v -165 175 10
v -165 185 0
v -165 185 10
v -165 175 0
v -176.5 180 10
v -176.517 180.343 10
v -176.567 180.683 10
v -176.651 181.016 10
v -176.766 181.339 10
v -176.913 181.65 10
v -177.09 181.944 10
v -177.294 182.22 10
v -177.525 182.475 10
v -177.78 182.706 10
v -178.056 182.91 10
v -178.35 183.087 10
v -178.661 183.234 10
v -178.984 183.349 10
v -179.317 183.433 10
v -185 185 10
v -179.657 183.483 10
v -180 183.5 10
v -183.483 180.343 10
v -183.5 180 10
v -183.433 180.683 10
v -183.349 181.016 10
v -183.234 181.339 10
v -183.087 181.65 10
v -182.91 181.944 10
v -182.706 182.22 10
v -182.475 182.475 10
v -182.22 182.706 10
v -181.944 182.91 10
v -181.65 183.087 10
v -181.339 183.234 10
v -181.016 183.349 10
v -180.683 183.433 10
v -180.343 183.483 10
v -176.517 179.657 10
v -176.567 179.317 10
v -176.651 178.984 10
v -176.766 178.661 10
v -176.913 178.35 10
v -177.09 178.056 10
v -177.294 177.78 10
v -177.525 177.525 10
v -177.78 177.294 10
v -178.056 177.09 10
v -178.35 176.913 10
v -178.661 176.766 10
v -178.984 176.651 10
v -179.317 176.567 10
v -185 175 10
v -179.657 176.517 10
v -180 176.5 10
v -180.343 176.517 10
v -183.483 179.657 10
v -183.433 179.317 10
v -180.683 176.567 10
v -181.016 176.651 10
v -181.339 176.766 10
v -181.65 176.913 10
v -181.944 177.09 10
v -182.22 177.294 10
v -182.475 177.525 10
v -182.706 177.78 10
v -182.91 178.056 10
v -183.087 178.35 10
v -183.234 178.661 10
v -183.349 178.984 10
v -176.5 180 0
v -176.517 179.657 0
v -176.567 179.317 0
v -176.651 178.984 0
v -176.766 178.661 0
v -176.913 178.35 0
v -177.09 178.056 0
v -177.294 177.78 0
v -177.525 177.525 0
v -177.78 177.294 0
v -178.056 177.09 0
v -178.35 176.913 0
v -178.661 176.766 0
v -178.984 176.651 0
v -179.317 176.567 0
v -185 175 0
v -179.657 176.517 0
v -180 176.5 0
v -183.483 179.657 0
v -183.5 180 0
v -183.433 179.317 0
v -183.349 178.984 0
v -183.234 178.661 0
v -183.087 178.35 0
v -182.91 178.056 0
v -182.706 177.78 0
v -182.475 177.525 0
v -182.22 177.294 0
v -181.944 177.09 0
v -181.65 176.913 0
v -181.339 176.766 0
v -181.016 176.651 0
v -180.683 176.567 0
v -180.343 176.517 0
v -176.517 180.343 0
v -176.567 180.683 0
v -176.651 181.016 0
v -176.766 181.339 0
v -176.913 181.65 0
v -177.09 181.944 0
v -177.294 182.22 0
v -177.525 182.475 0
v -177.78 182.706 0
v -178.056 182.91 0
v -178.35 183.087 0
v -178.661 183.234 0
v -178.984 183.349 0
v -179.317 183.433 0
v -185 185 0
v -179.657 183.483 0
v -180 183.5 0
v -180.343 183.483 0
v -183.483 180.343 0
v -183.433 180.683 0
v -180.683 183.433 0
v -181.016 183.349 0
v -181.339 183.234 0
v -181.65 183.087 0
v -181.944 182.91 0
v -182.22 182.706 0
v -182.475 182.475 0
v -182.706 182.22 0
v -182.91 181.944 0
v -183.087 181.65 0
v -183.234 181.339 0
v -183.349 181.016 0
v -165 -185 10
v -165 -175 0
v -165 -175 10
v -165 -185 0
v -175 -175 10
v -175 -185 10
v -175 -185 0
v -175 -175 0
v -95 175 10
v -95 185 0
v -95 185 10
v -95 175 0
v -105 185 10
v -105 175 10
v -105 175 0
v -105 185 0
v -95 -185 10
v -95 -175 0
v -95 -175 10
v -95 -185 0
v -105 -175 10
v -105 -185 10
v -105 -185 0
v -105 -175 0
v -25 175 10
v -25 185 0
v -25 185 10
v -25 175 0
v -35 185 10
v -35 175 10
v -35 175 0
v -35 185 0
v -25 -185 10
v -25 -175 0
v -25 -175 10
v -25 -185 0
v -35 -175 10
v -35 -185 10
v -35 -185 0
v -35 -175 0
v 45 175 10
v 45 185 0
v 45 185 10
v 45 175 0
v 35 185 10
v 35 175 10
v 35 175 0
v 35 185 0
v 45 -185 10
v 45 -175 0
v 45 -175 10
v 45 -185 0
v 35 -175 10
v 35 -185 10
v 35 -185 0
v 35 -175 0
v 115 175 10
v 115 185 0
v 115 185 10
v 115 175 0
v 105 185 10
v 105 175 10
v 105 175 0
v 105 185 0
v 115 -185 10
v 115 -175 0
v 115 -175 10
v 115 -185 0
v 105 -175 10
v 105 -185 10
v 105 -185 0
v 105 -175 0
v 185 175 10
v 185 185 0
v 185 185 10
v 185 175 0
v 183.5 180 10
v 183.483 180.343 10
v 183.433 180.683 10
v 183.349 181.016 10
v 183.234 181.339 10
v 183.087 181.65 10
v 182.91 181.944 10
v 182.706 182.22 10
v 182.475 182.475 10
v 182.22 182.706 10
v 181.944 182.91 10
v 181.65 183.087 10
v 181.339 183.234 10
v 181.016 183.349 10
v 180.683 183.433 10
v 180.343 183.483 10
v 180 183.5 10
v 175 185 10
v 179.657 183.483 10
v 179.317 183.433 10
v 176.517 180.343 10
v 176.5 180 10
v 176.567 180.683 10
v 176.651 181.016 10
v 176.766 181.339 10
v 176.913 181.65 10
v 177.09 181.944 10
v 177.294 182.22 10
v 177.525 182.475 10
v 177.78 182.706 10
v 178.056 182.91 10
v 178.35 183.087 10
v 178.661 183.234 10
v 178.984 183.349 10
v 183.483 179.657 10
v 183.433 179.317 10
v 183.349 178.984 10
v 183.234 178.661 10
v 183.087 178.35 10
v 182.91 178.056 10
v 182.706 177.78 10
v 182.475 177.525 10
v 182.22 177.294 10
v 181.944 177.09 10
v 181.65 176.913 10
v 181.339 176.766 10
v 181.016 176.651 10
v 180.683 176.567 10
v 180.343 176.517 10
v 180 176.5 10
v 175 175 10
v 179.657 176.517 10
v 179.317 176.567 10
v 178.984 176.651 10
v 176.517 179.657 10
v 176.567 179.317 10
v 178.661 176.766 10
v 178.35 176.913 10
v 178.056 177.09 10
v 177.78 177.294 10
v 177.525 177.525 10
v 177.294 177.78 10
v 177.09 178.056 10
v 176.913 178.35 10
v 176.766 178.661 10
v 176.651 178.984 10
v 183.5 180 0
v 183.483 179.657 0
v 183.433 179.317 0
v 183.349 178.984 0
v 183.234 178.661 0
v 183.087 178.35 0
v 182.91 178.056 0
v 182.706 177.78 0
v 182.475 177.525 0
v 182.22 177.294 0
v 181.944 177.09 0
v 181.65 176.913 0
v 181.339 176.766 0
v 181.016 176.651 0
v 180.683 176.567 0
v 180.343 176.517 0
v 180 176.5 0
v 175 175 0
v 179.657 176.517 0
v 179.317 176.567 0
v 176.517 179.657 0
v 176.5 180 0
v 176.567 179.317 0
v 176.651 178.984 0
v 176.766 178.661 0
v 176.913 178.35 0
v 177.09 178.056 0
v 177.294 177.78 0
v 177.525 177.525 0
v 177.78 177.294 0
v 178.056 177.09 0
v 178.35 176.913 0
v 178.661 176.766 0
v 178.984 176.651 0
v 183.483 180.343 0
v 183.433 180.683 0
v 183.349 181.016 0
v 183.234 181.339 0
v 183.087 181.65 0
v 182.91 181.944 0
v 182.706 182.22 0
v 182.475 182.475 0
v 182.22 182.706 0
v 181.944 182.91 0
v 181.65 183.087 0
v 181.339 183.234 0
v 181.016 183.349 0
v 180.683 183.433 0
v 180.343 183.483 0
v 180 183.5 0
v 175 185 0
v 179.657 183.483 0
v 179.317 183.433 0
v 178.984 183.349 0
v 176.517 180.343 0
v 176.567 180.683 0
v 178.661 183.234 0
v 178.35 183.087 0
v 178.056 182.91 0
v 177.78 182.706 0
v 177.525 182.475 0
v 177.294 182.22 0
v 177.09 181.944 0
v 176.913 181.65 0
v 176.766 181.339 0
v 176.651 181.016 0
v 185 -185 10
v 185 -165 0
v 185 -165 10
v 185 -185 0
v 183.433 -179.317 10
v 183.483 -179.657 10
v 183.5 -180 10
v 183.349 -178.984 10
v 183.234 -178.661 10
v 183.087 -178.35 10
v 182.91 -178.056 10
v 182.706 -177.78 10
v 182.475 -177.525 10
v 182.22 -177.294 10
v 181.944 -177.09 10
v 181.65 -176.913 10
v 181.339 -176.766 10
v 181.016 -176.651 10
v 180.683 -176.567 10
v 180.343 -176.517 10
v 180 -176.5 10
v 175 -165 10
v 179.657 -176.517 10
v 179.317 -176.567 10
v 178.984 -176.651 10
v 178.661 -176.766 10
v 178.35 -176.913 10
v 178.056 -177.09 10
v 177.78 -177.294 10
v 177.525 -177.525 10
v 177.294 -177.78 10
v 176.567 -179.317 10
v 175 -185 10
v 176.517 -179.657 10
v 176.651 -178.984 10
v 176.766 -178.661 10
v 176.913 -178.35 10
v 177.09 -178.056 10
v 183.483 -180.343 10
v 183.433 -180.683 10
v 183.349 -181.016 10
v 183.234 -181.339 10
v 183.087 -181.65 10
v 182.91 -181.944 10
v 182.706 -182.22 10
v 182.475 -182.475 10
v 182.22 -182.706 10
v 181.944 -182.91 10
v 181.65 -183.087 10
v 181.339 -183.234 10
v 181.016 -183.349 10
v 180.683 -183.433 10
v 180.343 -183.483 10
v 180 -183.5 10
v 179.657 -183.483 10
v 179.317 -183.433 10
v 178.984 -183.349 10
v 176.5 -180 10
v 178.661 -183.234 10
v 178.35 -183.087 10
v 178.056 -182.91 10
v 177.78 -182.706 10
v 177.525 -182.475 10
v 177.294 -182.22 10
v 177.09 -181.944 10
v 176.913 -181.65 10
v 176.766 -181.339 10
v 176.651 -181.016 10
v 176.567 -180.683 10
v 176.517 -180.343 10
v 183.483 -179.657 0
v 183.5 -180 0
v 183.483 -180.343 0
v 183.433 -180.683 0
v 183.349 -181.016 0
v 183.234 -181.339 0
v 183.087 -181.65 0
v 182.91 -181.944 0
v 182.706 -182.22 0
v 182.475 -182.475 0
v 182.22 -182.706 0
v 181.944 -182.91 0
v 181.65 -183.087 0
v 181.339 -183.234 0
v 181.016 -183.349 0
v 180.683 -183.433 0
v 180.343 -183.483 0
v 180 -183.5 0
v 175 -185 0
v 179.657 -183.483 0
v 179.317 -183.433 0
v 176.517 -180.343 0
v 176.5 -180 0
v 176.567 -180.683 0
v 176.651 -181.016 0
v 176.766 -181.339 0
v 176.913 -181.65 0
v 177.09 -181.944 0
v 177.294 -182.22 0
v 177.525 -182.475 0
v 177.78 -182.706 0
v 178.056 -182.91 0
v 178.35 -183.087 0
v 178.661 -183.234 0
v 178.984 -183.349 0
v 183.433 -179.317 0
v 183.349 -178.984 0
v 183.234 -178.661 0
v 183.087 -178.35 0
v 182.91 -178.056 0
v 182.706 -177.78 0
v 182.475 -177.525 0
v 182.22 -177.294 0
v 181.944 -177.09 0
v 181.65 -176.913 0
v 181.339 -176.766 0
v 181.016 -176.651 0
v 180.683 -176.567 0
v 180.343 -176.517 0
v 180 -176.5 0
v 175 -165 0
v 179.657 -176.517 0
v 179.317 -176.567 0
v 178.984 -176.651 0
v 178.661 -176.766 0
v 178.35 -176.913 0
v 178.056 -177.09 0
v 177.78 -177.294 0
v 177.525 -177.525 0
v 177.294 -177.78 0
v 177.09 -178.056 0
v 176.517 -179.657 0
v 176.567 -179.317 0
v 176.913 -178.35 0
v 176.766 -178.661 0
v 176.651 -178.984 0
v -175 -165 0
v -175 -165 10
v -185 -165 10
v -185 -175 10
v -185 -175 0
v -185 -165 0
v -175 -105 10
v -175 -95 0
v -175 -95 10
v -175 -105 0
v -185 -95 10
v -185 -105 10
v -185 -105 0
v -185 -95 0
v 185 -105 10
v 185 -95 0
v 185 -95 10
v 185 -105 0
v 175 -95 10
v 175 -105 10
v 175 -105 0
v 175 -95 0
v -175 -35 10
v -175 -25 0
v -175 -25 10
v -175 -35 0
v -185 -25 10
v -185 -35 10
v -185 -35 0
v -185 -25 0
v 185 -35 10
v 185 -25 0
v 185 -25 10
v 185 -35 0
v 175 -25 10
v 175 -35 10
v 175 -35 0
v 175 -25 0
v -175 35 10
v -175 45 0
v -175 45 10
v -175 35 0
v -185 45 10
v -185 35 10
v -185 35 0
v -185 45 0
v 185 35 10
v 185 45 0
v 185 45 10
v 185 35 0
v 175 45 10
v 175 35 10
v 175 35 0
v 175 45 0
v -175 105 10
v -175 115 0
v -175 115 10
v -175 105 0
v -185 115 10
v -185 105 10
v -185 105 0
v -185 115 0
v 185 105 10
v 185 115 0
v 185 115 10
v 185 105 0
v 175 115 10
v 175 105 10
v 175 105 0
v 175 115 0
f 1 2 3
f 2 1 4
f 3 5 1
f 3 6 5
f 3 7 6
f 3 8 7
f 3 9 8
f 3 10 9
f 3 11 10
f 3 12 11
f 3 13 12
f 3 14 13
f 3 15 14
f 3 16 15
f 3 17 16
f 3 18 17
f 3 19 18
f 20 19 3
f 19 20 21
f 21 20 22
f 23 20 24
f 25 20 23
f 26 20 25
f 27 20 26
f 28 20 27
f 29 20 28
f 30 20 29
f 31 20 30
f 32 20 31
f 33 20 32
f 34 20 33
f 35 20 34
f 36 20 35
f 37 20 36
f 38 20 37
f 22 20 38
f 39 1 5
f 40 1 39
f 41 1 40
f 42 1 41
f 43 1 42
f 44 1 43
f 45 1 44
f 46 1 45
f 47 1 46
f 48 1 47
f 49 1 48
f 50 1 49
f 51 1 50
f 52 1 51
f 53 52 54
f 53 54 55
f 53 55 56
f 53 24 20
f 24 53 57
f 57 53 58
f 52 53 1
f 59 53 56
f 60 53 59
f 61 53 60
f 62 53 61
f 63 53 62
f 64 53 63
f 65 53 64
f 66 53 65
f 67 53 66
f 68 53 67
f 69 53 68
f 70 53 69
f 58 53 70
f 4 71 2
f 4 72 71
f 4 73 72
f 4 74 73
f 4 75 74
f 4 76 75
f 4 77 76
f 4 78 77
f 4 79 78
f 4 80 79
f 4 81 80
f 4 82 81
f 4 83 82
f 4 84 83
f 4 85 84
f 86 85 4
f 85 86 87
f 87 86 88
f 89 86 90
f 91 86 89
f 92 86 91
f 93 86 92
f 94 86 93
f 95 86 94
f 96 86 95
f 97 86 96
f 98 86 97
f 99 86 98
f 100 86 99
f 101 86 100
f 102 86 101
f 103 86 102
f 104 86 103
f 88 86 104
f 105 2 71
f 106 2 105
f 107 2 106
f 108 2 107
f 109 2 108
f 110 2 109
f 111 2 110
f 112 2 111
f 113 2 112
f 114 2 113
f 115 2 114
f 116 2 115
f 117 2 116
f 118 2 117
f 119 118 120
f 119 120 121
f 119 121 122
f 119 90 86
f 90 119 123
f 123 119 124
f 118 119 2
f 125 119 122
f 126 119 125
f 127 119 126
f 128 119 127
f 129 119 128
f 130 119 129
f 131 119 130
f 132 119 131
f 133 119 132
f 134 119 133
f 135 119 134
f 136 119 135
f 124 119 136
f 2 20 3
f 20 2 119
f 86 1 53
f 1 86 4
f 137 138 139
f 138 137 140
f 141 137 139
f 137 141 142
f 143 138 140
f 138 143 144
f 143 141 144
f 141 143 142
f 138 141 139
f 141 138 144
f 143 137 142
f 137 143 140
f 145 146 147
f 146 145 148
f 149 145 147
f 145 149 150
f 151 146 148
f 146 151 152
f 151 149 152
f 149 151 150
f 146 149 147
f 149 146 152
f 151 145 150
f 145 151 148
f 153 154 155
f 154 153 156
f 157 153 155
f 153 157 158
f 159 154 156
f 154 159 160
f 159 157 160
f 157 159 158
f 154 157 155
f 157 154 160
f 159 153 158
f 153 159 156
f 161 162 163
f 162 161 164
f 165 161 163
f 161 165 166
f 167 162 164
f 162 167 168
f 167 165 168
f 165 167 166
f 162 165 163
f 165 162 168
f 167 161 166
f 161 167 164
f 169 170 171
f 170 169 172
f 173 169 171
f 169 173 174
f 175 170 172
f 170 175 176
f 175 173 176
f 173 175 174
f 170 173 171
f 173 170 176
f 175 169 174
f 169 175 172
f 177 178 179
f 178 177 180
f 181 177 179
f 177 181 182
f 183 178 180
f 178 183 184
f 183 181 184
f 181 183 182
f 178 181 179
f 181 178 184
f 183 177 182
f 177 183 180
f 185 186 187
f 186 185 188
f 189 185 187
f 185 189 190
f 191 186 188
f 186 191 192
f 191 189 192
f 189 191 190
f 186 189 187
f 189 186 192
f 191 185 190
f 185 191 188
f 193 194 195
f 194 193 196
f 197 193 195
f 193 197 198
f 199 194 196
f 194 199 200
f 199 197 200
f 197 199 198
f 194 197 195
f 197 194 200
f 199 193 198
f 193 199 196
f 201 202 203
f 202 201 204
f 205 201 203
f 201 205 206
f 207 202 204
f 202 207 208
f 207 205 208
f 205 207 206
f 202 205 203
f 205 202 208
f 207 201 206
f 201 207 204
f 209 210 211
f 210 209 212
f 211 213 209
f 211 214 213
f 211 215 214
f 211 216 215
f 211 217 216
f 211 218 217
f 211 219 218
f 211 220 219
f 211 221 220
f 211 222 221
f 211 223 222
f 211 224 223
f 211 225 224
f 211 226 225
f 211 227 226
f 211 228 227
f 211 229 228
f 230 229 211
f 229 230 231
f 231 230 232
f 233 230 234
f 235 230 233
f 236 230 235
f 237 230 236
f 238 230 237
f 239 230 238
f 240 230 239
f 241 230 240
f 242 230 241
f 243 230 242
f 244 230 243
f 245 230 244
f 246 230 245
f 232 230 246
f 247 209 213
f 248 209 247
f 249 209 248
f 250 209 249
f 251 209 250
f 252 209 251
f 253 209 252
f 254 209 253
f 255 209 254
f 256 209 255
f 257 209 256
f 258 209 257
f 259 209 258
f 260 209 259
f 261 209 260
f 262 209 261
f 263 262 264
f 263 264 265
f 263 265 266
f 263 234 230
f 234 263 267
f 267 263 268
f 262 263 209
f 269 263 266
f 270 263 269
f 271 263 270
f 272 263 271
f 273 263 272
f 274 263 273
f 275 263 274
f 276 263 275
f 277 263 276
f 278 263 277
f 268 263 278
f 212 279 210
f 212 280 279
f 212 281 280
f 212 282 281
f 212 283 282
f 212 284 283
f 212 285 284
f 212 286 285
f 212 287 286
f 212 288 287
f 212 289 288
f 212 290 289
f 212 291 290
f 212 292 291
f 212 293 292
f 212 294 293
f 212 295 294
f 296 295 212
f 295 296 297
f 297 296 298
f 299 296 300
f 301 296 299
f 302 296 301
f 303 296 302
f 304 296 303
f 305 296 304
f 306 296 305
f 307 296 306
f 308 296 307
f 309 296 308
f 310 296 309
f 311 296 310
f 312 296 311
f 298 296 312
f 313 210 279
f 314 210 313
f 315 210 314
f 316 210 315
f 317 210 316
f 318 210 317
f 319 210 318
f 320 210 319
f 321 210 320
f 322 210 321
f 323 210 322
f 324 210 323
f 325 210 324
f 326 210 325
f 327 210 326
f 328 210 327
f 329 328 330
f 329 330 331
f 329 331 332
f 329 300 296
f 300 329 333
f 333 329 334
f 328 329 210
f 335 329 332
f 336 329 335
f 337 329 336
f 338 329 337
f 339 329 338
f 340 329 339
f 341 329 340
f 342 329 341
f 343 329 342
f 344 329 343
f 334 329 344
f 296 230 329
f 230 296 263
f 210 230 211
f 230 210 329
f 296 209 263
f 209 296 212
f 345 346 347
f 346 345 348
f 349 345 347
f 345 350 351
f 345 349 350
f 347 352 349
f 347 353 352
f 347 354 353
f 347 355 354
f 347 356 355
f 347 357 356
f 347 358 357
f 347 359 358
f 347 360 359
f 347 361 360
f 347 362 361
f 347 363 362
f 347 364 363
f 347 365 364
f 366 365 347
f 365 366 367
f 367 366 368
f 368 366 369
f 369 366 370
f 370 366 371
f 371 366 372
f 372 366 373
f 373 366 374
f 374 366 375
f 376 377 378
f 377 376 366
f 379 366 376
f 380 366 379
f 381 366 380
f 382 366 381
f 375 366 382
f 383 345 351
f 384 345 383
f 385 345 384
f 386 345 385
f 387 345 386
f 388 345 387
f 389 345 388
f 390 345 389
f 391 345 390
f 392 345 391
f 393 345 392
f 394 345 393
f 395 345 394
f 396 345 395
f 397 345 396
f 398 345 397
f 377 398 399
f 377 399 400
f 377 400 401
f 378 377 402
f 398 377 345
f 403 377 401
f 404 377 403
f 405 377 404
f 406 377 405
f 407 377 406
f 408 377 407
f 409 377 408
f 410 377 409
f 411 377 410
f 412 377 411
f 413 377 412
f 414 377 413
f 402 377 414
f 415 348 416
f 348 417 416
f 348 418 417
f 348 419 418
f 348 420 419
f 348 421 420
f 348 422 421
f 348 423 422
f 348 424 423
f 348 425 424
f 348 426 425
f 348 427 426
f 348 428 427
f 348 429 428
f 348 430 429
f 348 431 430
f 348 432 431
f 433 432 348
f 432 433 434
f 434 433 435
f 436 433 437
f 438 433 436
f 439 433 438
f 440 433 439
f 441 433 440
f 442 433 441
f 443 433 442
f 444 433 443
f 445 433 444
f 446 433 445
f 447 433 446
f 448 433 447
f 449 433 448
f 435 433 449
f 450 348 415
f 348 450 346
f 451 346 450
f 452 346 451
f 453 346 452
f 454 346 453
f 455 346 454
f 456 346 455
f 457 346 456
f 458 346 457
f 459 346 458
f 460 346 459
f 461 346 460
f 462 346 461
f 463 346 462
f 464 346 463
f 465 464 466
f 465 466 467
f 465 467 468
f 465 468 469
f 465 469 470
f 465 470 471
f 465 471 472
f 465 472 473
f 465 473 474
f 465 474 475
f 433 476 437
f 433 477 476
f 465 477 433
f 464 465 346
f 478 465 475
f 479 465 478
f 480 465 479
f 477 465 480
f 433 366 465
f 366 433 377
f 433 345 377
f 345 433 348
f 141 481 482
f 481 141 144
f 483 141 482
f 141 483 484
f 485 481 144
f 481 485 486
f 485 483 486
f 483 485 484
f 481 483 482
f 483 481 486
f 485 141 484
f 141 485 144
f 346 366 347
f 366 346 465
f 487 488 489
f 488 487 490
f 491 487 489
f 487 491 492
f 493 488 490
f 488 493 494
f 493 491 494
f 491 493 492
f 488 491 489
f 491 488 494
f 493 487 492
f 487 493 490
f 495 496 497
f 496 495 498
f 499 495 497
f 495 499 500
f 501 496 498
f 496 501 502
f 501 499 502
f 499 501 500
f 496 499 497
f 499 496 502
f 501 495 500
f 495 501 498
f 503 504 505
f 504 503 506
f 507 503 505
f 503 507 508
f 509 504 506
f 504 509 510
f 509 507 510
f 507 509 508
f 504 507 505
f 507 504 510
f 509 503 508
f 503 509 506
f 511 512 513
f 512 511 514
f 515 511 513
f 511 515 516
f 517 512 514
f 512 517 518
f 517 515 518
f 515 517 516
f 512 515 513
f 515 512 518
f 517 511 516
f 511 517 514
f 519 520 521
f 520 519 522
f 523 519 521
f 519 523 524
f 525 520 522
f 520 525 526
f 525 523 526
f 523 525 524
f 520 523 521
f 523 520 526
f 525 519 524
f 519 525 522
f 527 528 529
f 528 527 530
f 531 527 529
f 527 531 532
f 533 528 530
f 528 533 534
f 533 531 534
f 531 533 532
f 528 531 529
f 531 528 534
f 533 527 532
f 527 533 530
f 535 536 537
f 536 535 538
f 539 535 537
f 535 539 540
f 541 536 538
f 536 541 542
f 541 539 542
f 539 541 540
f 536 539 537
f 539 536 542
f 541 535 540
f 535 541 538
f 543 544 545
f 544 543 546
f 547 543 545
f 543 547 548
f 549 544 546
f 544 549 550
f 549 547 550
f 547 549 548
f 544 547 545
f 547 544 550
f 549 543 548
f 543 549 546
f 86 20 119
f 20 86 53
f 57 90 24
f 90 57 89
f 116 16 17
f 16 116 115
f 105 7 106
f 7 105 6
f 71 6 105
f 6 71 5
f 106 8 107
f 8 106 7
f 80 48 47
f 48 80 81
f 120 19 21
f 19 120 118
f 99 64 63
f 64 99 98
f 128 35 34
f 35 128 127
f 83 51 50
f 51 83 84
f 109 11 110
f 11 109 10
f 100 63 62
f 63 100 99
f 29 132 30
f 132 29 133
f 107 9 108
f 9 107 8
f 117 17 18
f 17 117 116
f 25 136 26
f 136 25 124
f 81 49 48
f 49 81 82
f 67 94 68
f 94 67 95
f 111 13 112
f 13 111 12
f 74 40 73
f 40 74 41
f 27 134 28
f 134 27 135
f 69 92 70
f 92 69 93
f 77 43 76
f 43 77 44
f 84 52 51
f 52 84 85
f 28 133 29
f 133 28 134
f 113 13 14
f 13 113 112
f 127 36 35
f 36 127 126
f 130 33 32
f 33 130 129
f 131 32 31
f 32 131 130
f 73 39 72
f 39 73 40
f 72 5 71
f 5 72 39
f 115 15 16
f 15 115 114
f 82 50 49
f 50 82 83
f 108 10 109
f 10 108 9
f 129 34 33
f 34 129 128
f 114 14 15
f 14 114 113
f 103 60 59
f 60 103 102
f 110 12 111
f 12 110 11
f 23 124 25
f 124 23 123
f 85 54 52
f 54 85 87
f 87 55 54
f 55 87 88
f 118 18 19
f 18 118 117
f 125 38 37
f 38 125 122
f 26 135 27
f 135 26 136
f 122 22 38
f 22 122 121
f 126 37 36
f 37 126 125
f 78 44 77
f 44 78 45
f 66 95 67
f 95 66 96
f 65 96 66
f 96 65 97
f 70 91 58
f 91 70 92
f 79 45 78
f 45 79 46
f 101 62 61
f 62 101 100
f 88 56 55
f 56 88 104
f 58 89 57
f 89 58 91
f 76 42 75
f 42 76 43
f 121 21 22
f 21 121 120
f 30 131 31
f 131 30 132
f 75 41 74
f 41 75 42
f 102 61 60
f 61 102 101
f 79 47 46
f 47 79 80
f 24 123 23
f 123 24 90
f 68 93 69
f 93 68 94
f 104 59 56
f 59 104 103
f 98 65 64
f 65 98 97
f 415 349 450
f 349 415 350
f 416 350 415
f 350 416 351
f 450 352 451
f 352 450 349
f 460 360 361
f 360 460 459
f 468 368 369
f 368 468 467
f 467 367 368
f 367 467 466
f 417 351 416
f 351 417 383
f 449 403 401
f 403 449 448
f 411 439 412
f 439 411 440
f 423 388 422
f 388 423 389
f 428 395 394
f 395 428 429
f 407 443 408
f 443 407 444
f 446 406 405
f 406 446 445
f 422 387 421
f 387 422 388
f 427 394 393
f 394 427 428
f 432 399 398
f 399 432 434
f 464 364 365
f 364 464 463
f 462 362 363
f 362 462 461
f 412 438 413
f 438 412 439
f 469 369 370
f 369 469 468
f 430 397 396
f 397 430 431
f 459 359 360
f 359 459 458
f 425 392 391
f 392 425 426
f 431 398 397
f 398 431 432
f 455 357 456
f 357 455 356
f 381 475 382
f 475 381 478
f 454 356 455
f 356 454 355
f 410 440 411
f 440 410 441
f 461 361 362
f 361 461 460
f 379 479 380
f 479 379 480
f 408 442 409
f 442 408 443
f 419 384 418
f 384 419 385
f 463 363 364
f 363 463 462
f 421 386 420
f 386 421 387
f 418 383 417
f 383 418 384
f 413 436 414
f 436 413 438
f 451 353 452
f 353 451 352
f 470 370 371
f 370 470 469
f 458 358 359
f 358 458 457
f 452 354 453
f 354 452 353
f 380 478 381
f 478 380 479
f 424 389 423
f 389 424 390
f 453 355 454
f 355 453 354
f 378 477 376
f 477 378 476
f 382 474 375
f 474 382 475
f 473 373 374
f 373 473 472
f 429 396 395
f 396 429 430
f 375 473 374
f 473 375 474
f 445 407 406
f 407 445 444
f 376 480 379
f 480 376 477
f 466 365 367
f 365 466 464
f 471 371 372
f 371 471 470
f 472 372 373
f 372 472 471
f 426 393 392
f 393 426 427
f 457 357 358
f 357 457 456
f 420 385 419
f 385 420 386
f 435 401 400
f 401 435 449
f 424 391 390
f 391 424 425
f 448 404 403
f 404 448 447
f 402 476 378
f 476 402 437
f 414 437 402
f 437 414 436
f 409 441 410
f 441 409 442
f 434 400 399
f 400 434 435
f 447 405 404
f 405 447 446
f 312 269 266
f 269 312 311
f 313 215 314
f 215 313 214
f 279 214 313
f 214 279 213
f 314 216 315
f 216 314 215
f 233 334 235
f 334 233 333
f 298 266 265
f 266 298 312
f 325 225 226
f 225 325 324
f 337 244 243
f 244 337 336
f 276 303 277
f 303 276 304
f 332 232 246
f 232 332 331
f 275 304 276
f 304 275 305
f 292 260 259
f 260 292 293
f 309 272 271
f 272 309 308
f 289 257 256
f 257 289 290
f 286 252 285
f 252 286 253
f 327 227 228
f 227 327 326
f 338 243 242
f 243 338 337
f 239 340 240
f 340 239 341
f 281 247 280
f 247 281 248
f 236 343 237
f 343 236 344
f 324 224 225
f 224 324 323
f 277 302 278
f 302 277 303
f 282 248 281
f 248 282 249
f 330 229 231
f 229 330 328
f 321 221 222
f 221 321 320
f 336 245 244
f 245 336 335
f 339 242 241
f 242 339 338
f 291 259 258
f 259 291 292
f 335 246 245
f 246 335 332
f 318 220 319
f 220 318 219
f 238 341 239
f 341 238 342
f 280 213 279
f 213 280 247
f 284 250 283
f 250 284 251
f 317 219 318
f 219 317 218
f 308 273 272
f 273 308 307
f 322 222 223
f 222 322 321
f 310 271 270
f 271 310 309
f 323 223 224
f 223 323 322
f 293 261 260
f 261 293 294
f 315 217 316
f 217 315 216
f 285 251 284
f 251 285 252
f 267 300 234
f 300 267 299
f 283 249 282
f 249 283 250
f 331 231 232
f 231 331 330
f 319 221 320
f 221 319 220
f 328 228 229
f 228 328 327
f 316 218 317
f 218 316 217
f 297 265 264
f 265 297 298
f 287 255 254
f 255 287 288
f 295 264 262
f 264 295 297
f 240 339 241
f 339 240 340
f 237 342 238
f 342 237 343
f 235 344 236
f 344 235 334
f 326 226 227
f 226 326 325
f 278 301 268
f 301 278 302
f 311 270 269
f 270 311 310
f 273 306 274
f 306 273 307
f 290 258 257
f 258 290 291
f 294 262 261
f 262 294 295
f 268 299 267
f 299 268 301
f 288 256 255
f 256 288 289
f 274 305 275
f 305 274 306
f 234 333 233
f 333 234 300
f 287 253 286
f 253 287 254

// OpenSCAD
// ring_51.scad - ring index 51 (z bottom = 510 mm)
$fn = 64; bar = 10; half_b = bar/2; outer = 370; half_outer = outer/2;
front_y = 180; back_y = -180; left_x = -180; right_x = 180;
x_centers = [-170, -100, -30, 40, 110, 180];
z_centers = [5, 85, 155, 225, 295, 365, 435, 505, 575, 645, 715]; ring_z = 510;
module place_box(cx, cy, sx, sy) { translate([cx - sx/2, cy - sy/2, 0]) cube([sx, sy, bar]); }

difference() { union() {
    for (x = x_centers) { place_box(x, front_y, bar, bar); place_box(x, back_y, bar, bar); }
    for (y = x_centers) { place_box(left_x, y, bar, bar); place_box(right_x, y, bar, bar); }
    for (zc = z_centers) if ((zc - half_b < ring_z + bar) && (zc + half_b > ring_z)) {
        translate([-half_outer, front_y - half_b, 0]) cube([outer, bar, bar]);
        translate([-half_outer, back_y - half_b, 0])  cube([outer, bar, bar]);
        translate([left_x - half_b, -half_outer, 0])  cube([bar, outer, bar]);
        translate([right_x - half_b, -half_outer, 0]) cube([bar, outer, bar]);
    }
  }
  for (cx = [-180, 180]) for (cy = [-180, 180]) translate([cx, cy, 0]) cylinder(h = bar, r = 3.5, $fn = 64);
}
